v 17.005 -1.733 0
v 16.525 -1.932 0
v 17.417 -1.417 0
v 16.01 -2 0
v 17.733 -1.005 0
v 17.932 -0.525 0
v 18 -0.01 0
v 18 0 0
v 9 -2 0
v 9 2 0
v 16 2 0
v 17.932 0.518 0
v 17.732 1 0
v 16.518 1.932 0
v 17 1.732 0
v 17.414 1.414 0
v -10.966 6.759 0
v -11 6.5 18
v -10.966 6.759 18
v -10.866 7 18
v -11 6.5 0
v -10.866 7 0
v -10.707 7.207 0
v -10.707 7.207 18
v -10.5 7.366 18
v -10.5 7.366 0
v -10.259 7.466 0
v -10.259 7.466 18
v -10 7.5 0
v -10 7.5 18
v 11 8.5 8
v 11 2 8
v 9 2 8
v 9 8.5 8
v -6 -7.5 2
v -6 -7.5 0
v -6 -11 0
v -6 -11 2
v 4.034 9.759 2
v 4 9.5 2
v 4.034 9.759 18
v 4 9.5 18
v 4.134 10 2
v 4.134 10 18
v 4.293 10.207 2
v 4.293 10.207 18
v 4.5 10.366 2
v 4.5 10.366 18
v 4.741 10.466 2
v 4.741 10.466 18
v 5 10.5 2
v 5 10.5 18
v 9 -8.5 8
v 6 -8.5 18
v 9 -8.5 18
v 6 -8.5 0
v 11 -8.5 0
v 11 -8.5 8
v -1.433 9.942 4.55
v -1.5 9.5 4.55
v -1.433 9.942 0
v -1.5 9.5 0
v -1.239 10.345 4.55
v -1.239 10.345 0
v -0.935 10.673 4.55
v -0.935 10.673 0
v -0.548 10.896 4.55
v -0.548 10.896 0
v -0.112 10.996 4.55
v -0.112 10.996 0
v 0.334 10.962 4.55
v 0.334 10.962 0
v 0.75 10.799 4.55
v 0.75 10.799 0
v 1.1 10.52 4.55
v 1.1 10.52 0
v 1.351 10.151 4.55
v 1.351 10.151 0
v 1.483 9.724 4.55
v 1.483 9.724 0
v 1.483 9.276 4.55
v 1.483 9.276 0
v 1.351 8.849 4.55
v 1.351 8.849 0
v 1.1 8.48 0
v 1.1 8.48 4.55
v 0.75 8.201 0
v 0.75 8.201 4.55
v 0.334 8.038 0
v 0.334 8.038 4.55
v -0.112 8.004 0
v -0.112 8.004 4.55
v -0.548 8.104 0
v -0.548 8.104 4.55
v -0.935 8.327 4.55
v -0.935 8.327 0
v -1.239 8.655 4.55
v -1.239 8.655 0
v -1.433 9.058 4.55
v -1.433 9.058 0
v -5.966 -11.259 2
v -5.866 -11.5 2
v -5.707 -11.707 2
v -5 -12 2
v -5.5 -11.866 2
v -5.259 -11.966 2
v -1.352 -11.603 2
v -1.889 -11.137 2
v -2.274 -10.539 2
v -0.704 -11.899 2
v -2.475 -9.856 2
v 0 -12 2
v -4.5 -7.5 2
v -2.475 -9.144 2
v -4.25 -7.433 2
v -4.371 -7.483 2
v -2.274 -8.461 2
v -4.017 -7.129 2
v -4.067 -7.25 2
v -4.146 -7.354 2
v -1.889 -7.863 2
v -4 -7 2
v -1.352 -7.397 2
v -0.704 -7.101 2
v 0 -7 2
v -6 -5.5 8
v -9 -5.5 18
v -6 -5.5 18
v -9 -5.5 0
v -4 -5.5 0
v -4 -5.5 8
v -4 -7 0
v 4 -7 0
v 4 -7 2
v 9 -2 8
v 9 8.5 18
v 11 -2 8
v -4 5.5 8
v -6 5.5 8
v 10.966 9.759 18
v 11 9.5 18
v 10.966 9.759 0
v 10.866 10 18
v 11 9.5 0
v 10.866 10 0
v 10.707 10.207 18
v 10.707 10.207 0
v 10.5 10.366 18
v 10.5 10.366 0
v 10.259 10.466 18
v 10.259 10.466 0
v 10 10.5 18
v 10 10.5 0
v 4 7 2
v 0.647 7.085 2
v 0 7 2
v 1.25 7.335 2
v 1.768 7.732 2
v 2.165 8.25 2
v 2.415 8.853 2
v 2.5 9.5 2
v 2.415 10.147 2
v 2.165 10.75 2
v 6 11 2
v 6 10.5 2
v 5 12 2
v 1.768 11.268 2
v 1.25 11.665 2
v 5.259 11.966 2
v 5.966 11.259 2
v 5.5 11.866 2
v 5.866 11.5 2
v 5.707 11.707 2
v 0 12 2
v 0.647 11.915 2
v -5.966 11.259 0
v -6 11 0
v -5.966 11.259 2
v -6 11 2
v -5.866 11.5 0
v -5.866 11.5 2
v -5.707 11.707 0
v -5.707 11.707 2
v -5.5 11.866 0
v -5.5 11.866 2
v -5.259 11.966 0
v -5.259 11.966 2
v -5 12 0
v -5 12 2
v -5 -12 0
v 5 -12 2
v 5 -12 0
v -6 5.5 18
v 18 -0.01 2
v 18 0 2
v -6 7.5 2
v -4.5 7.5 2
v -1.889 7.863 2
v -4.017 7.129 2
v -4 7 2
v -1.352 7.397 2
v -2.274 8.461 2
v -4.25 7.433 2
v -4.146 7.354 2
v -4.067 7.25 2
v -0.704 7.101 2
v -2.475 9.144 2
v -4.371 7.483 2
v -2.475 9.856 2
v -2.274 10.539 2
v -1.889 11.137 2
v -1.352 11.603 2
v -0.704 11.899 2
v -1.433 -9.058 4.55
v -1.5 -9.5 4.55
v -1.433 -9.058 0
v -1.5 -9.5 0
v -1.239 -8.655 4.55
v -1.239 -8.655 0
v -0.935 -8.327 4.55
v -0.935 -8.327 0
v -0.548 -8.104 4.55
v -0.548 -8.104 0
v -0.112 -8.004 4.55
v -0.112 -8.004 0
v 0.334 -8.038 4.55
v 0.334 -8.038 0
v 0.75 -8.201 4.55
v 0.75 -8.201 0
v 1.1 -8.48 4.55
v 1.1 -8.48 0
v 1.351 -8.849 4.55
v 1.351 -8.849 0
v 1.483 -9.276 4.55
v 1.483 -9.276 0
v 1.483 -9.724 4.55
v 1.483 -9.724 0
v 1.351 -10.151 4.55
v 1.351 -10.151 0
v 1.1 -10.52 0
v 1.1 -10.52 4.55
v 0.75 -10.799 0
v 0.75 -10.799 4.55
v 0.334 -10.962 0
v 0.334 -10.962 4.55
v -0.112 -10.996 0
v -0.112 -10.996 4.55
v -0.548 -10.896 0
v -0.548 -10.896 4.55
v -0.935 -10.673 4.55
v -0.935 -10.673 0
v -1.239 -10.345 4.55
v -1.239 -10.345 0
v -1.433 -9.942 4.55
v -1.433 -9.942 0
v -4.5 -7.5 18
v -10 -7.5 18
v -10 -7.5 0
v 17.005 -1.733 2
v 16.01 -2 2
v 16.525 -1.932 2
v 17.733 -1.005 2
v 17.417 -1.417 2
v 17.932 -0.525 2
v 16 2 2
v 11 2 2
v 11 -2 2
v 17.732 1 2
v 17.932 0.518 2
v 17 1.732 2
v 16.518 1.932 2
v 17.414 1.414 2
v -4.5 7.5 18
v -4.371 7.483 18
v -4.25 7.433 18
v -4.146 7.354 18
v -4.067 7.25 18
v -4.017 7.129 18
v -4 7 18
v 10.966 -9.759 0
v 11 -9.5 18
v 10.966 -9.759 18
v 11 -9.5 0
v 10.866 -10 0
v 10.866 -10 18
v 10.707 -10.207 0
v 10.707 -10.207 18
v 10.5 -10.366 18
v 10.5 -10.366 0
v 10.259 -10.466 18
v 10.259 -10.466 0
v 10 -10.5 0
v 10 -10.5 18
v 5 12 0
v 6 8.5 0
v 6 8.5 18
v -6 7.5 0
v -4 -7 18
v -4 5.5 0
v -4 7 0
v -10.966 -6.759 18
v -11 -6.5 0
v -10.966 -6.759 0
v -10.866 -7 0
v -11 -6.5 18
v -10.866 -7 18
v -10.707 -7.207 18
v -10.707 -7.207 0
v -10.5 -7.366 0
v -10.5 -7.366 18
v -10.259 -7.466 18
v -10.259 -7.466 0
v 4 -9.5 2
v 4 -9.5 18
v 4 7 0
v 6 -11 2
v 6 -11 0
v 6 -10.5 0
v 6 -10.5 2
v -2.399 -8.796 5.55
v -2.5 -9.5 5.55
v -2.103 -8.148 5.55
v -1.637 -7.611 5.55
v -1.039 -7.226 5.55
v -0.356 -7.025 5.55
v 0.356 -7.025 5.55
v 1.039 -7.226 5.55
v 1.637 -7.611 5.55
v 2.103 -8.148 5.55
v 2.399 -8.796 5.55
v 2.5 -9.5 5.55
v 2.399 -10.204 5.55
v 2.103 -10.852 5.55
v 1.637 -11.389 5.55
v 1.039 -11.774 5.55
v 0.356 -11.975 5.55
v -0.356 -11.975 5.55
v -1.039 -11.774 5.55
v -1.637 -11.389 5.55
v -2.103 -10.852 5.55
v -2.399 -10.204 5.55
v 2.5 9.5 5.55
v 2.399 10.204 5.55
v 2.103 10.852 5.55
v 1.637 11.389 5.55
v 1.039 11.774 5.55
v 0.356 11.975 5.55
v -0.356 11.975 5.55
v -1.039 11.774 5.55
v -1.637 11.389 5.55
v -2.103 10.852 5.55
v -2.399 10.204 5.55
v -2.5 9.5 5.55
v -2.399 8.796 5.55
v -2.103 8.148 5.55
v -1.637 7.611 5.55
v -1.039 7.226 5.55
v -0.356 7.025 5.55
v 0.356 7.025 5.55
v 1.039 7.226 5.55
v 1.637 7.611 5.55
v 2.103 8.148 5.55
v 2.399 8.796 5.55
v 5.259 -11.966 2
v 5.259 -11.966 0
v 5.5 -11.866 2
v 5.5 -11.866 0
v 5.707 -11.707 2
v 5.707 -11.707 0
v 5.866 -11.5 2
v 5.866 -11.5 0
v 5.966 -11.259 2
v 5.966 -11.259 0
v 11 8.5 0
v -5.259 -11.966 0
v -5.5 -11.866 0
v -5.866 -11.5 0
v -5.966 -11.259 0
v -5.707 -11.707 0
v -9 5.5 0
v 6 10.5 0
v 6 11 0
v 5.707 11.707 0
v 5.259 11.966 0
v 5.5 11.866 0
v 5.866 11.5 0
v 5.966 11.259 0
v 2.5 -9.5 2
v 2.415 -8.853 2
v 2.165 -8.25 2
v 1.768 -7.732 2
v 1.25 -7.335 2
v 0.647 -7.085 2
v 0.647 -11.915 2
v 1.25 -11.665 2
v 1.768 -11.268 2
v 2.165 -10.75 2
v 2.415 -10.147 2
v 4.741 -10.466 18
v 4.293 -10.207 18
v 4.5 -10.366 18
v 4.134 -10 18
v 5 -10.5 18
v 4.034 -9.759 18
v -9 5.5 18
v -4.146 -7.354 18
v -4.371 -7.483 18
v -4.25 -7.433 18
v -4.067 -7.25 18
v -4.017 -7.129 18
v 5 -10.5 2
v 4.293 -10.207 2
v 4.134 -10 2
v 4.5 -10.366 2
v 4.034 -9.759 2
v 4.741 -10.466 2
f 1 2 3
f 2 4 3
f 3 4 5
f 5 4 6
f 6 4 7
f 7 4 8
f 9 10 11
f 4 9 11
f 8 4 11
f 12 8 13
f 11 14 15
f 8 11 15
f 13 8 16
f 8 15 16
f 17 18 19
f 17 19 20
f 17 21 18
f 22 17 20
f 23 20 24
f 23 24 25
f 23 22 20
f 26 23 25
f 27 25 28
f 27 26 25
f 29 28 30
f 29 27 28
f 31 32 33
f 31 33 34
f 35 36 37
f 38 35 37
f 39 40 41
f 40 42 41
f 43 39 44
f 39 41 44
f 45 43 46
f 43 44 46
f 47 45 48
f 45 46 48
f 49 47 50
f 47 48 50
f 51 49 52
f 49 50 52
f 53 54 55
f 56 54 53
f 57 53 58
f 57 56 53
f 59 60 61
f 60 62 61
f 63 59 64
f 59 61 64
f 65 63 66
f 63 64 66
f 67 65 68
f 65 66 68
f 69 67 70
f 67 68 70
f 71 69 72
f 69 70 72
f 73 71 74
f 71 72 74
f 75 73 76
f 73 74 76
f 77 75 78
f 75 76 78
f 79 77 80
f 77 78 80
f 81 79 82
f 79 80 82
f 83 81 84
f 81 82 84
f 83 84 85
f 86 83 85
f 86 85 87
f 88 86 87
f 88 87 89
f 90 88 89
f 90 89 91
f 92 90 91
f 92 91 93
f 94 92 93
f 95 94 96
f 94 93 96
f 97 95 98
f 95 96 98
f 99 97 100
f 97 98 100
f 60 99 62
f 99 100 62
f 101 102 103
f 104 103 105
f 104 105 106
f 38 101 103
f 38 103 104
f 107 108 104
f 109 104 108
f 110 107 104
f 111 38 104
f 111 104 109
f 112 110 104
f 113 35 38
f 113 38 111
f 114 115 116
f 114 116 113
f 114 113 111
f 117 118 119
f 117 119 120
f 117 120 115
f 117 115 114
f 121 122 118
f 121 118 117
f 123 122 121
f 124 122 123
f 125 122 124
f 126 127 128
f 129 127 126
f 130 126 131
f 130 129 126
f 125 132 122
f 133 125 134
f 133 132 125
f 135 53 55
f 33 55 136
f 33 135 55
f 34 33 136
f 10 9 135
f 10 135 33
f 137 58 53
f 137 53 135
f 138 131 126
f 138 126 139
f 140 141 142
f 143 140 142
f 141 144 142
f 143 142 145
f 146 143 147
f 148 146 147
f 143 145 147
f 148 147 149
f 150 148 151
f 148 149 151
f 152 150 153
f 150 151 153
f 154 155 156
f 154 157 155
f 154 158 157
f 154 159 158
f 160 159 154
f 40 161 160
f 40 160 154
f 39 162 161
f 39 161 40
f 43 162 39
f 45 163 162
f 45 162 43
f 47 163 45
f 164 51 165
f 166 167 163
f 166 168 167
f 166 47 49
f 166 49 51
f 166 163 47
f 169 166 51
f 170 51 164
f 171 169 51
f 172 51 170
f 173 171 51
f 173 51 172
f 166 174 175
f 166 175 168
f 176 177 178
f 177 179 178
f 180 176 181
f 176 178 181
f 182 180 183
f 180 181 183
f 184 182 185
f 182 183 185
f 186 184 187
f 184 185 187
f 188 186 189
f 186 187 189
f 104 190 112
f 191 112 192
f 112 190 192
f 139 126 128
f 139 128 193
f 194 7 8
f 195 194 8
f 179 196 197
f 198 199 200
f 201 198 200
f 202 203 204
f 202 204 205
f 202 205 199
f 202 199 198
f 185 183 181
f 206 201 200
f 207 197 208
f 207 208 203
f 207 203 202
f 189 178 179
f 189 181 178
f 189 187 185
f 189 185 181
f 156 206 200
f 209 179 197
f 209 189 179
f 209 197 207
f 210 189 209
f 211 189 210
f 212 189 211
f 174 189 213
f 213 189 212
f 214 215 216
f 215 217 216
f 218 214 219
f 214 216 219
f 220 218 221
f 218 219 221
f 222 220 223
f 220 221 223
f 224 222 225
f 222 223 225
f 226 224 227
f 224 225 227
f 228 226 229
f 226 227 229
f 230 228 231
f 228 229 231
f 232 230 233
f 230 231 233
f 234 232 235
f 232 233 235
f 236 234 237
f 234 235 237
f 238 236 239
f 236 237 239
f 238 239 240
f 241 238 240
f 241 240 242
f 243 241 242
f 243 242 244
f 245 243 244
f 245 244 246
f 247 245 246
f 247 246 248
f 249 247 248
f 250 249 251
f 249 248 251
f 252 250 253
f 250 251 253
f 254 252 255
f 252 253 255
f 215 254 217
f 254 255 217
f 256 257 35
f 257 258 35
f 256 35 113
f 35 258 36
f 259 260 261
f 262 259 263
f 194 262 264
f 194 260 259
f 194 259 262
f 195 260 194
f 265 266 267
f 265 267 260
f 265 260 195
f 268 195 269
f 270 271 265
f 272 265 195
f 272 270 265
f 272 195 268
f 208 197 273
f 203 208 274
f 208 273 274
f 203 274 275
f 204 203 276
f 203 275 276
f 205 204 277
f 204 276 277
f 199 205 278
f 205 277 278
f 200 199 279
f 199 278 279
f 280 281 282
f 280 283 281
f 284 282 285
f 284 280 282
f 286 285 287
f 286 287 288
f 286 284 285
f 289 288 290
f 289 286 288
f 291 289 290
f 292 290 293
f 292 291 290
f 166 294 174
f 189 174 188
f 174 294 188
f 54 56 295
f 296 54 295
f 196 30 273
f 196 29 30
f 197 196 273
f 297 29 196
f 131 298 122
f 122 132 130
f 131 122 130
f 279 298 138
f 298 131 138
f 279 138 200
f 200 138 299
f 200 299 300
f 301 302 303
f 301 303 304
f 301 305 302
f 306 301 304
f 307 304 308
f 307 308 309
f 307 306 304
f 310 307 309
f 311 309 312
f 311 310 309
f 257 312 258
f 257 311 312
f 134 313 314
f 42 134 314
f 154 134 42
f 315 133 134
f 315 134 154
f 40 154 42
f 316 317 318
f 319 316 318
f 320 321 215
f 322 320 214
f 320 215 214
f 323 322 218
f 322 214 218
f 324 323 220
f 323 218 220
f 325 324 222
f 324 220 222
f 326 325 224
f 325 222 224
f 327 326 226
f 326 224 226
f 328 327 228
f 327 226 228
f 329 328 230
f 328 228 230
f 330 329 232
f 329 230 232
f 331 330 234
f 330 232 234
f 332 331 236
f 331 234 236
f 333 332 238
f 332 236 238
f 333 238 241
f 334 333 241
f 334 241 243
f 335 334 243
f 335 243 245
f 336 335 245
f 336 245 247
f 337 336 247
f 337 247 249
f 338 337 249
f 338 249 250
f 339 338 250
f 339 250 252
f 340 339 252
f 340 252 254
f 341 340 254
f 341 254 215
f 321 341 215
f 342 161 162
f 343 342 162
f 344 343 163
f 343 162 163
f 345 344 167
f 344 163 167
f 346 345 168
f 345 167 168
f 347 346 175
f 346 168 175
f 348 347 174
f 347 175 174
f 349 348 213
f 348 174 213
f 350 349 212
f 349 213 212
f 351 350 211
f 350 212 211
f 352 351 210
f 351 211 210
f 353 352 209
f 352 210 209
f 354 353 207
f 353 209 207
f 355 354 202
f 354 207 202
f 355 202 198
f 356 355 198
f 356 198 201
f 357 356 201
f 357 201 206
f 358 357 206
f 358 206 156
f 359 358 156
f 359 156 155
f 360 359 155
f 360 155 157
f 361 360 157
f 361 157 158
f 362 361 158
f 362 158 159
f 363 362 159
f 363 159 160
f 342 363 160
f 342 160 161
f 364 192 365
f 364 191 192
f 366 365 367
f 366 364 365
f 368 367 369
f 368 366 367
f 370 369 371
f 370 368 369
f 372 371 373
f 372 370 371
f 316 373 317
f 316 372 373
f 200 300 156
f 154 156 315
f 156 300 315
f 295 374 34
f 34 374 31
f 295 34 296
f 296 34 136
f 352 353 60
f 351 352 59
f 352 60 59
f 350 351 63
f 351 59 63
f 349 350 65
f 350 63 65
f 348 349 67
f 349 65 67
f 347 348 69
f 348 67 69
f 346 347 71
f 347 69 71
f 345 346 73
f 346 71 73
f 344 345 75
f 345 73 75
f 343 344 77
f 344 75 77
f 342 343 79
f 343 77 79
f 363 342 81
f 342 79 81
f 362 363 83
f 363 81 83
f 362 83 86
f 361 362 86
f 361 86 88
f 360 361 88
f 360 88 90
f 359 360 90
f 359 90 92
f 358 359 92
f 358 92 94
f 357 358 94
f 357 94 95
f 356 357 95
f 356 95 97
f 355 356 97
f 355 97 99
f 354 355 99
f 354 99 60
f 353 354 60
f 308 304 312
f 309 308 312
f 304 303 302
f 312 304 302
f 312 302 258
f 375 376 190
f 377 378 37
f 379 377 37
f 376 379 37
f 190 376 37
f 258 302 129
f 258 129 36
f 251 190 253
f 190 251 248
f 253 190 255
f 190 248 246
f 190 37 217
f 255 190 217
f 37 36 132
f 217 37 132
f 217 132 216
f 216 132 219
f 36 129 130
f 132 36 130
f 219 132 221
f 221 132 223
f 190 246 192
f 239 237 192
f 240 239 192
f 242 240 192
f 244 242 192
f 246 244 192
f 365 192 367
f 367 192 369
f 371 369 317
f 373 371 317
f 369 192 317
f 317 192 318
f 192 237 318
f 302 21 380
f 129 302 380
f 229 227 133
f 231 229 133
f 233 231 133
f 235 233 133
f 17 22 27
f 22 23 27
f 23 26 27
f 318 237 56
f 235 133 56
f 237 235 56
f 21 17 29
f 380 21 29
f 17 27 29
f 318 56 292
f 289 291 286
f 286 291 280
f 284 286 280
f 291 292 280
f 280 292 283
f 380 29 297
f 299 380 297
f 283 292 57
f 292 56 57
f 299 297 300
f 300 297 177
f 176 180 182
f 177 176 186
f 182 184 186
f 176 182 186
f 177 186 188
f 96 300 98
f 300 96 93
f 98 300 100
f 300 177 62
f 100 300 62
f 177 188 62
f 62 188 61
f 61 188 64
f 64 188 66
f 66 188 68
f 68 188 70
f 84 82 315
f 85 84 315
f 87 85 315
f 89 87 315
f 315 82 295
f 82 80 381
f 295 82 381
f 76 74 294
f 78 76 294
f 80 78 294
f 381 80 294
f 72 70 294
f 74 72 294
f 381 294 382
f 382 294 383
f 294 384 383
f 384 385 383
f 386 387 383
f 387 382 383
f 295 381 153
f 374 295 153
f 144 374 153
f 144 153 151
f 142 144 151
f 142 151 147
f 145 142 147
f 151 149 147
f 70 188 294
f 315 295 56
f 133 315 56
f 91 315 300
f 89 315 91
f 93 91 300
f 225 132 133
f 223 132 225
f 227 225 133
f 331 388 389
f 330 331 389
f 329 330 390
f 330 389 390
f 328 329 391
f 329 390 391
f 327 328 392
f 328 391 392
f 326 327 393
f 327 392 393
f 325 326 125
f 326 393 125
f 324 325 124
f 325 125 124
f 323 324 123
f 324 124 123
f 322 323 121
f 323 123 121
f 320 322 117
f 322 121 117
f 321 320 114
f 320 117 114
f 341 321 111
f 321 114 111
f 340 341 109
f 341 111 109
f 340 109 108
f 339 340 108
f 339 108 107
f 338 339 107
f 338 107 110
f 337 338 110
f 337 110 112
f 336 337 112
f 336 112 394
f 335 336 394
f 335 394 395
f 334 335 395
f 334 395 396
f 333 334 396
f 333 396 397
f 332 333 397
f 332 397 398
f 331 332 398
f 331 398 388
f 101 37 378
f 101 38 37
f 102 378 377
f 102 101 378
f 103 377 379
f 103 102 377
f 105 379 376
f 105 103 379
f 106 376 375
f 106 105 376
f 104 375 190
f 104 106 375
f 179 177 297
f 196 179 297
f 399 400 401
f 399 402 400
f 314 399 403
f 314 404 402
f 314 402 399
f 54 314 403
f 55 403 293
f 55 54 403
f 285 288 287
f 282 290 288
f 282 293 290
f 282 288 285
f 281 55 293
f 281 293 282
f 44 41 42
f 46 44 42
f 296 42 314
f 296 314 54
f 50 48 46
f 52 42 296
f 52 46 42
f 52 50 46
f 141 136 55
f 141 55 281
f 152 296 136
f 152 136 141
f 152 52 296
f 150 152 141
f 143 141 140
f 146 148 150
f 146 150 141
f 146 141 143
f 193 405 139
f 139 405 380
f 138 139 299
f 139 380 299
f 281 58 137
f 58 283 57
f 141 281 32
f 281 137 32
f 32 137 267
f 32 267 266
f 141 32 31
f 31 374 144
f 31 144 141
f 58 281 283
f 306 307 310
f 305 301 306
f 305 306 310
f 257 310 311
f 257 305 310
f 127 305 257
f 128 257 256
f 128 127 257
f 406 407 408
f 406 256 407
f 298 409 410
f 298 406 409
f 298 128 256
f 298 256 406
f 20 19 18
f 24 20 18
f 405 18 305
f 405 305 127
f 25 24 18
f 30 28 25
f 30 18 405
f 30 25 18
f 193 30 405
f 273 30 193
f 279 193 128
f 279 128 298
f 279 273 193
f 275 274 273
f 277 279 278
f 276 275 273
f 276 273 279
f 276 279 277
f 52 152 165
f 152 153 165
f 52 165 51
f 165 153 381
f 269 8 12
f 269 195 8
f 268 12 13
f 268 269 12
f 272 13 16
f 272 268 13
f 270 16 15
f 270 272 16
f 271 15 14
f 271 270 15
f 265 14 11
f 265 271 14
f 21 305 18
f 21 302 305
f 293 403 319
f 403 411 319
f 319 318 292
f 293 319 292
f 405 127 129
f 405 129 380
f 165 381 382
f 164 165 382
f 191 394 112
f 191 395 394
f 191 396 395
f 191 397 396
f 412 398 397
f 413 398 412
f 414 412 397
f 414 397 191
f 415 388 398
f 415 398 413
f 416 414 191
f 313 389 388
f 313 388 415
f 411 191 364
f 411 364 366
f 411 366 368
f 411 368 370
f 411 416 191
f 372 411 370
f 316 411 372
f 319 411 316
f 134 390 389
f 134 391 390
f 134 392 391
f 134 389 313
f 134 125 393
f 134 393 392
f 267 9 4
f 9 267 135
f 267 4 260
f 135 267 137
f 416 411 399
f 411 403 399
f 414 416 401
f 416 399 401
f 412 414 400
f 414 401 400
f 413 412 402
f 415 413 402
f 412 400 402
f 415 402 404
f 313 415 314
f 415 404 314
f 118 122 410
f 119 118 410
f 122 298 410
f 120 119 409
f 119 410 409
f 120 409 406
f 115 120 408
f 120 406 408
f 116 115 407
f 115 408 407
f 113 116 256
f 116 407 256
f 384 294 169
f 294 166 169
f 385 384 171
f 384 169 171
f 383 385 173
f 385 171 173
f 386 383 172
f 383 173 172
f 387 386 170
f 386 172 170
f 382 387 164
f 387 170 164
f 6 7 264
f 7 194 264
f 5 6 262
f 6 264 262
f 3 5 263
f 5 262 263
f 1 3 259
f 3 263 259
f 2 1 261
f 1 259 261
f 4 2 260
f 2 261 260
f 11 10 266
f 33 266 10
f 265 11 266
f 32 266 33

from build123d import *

# Parameters (mm, degrees)
SKETCH001_W      = 8
SKETCH001_H      = 14
SKETCH001_W_2    = 3
SKETCH001_H_2    = 17
SKETCH001_H_3    = 11
PAD_DEPTH        = 2
SKETCH_R         = 2.5
PAD001_DEPTH     = 4
HOLE_D           = 3
HOLE_DEPTH       = 25
HOLE_CSINK_D     = 5.9
HOLE_CSINK_ANGLE = 90
SKETCH003_W      = 7
SKETCH003_H      = 15
SKETCH003_W_2    = 3
SKETCH003_H_2    = 11
SKETCH003_H_3    = 21
SKETCH003_H_4    = 17
PAD002_DEPTH     = 16
SKETCH004_W      = 6.5
SKETCH004_H      = 8
POCKET_DEPTH     = 2
SKETCH005_W      = 11
SKETCH005_H      = 8
POCKET001_DEPTH  = 2
FILLET_R         = 2
FILLET001_R      = 1.99
FILLET002_R      = 1
FILLET003_R      = 1
FILLET004_R      = 1
FILLET005_R      = 1
FILLET006_R      = 1
FILLET007_R      = 1
FILLET008_R      = 0.5
FILLET009_R      = 0.5
FILLET010_R      = 1
FILLET011_R      = 1
FILLET012_R      = 1
FILLET013_R      = 1


with BuildPart() as part:
    # Sketch001 → Pad (new body)
    with BuildSketch(Plane.XY):
        Polygon((6, 12), (-6, 12), (-6, 7.5), (-11, 7.5), (-11, -7.5), (-6, -7.5), (-6, -12), (6, -12), (6, -10.5), (11, -10.5), (11, -2), (18, -2), (18, 2), (11, 2), (11, 10.5), (6, 10.5), align=None)
        Rectangle(SKETCH001_W, SKETCH001_H, mode=Mode.SUBTRACT)
        with Locations((7.5, 0)):
            Rectangle(SKETCH001_W_2, SKETCH001_H_2, mode=Mode.SUBTRACT)
        with Locations((-7.5, 0)):
            Rectangle(SKETCH001_W_2, SKETCH001_H_3, mode=Mode.SUBTRACT)
    extrude(amount=PAD_DEPTH)

    # Sketch (on Face30 of Pad) → Pad001 (join)
    with BuildSketch(Plane.XY.offset(2)):
        with Locations((0, 9.5)):
            Circle(SKETCH_R)
        with Locations((0, -9.5)):
            Circle(SKETCH_R)
    extrude(amount=PAD001_DEPTH)

    # Hole
    with Locations(Plane.XY.offset(6)):
        with Locations((0, 9.5), (0, -9.5)):
            CounterSinkHole(HOLE_D / 2, HOLE_CSINK_D / 2, depth=HOLE_DEPTH, counter_sink_angle=HOLE_CSINK_ANGLE)

    # Sketch003 (on Face5 of Hole) → Pad002 (join)
    with BuildSketch(Plane.XY.offset(2)):
        with Locations((-7.5, 0)):
            Rectangle(SKETCH003_W, SKETCH003_H)
        with Locations((-7.5, 0)):
            Rectangle(SKETCH003_W_2, SKETCH003_H_2, mode=Mode.SUBTRACT)
        with Locations((7.5, 0)):
            Rectangle(SKETCH003_W, SKETCH003_H_3)
        with Locations((7.5, 0)):
            Rectangle(SKETCH003_W_2, SKETCH003_H_4, mode=Mode.SUBTRACT)
    extrude(amount=PAD002_DEPTH)

    # Sketch004 (on Face37 of Pad002) → Pocket (cut)
    with BuildSketch(Plane.YZ.offset(11)):
        with Locations((-5.25, 4)):
            Rectangle(SKETCH004_W, SKETCH004_H)
        with Locations((5.25, 4)):
            Rectangle(SKETCH004_W, SKETCH004_H)
    extrude(amount=-POCKET_DEPTH, mode=Mode.SUBTRACT)

    # Sketch005 (on Face37 of Pocket) → Pocket001 (cut)
    with BuildSketch(Plane.YZ.offset(-4)):
        with Locations((0, 4)):
            Rectangle(SKETCH005_W, SKETCH005_H)
    extrude(amount=-POCKET001_DEPTH, mode=Mode.SUBTRACT)

    # Fillet
    fillet_edges = [part.edges().sort_by_distance(p)[0] for p in [
        (18, 2, 1),
    ]]
    fillet(fillet_edges, radius=FILLET_R)

    # Fillet001
    fillet001_edges = [part.edges().sort_by_distance(p)[0] for p in [
        (18, -2, 1),
    ]]
    fillet(fillet001_edges, radius=FILLET001_R)

    # Fillet002
    fillet002_edges = [part.edges().sort_by_distance(p)[0] for p in [
        (11, 10.5, 10),
    ]]
    fillet(fillet002_edges, radius=FILLET002_R)

    # Fillet003
    fillet003_edges = [part.edges().sort_by_distance(p)[0] for p in [
        (11, -10.5, 10),
    ]]
    fillet(fillet003_edges, radius=FILLET003_R)

    # Fillet004
    fillet004_edges = [part.edges().sort_by_distance(p)[0] for p in [
        (4, -10.5, 10),
    ]]
    fillet(fillet004_edges, radius=FILLET004_R)

    # Fillet005
    fillet005_edges = [part.edges().sort_by_distance(p)[0] for p in [
        (4, 10.5, 10),
    ]]
    fillet(fillet005_edges, radius=FILLET005_R)

    # Fillet006
    fillet006_edges = [part.edges().sort_by_distance(p)[0] for p in [
        (-11, 7.5, 10),
    ]]
    fillet(fillet006_edges, radius=FILLET006_R)

    # Fillet007
    fillet007_edges = [part.edges().sort_by_distance(p)[0] for p in [
        (-11, -7.5, 10),
    ]]
    fillet(fillet007_edges, radius=FILLET007_R)

    # Fillet008
    fillet008_edges = [part.edges().sort_by_distance(p)[0] for p in [
        (-4, 7.5, 10),
    ]]
    fillet(fillet008_edges, radius=FILLET008_R)

    # Fillet009
    fillet009_edges = [part.edges().sort_by_distance(p)[0] for p in [
        (-4, -7.5, 10),
    ]]
    fillet(fillet009_edges, radius=FILLET009_R)

    # Fillet010
    fillet010_edges = [part.edges().sort_by_distance(p)[0] for p in [
        (-6, -12, 1),
    ]]
    fillet(fillet010_edges, radius=FILLET010_R)

    # Fillet011
    fillet011_edges = [part.edges().sort_by_distance(p)[0] for p in [
        (6, -12, 1),
    ]]
    fillet(fillet011_edges, radius=FILLET011_R)

    # Fillet012
    fillet012_edges = [part.edges().sort_by_distance(p)[0] for p in [
        (-6, 12, 1),
    ]]
    fillet(fillet012_edges, radius=FILLET012_R)

    # Fillet013
    fillet013_edges = [part.edges().sort_by_distance(p)[0] for p in [
        (6, 12, 1),
    ]]
    fillet(fillet013_edges, radius=FILLET013_R)


solid = part.part
